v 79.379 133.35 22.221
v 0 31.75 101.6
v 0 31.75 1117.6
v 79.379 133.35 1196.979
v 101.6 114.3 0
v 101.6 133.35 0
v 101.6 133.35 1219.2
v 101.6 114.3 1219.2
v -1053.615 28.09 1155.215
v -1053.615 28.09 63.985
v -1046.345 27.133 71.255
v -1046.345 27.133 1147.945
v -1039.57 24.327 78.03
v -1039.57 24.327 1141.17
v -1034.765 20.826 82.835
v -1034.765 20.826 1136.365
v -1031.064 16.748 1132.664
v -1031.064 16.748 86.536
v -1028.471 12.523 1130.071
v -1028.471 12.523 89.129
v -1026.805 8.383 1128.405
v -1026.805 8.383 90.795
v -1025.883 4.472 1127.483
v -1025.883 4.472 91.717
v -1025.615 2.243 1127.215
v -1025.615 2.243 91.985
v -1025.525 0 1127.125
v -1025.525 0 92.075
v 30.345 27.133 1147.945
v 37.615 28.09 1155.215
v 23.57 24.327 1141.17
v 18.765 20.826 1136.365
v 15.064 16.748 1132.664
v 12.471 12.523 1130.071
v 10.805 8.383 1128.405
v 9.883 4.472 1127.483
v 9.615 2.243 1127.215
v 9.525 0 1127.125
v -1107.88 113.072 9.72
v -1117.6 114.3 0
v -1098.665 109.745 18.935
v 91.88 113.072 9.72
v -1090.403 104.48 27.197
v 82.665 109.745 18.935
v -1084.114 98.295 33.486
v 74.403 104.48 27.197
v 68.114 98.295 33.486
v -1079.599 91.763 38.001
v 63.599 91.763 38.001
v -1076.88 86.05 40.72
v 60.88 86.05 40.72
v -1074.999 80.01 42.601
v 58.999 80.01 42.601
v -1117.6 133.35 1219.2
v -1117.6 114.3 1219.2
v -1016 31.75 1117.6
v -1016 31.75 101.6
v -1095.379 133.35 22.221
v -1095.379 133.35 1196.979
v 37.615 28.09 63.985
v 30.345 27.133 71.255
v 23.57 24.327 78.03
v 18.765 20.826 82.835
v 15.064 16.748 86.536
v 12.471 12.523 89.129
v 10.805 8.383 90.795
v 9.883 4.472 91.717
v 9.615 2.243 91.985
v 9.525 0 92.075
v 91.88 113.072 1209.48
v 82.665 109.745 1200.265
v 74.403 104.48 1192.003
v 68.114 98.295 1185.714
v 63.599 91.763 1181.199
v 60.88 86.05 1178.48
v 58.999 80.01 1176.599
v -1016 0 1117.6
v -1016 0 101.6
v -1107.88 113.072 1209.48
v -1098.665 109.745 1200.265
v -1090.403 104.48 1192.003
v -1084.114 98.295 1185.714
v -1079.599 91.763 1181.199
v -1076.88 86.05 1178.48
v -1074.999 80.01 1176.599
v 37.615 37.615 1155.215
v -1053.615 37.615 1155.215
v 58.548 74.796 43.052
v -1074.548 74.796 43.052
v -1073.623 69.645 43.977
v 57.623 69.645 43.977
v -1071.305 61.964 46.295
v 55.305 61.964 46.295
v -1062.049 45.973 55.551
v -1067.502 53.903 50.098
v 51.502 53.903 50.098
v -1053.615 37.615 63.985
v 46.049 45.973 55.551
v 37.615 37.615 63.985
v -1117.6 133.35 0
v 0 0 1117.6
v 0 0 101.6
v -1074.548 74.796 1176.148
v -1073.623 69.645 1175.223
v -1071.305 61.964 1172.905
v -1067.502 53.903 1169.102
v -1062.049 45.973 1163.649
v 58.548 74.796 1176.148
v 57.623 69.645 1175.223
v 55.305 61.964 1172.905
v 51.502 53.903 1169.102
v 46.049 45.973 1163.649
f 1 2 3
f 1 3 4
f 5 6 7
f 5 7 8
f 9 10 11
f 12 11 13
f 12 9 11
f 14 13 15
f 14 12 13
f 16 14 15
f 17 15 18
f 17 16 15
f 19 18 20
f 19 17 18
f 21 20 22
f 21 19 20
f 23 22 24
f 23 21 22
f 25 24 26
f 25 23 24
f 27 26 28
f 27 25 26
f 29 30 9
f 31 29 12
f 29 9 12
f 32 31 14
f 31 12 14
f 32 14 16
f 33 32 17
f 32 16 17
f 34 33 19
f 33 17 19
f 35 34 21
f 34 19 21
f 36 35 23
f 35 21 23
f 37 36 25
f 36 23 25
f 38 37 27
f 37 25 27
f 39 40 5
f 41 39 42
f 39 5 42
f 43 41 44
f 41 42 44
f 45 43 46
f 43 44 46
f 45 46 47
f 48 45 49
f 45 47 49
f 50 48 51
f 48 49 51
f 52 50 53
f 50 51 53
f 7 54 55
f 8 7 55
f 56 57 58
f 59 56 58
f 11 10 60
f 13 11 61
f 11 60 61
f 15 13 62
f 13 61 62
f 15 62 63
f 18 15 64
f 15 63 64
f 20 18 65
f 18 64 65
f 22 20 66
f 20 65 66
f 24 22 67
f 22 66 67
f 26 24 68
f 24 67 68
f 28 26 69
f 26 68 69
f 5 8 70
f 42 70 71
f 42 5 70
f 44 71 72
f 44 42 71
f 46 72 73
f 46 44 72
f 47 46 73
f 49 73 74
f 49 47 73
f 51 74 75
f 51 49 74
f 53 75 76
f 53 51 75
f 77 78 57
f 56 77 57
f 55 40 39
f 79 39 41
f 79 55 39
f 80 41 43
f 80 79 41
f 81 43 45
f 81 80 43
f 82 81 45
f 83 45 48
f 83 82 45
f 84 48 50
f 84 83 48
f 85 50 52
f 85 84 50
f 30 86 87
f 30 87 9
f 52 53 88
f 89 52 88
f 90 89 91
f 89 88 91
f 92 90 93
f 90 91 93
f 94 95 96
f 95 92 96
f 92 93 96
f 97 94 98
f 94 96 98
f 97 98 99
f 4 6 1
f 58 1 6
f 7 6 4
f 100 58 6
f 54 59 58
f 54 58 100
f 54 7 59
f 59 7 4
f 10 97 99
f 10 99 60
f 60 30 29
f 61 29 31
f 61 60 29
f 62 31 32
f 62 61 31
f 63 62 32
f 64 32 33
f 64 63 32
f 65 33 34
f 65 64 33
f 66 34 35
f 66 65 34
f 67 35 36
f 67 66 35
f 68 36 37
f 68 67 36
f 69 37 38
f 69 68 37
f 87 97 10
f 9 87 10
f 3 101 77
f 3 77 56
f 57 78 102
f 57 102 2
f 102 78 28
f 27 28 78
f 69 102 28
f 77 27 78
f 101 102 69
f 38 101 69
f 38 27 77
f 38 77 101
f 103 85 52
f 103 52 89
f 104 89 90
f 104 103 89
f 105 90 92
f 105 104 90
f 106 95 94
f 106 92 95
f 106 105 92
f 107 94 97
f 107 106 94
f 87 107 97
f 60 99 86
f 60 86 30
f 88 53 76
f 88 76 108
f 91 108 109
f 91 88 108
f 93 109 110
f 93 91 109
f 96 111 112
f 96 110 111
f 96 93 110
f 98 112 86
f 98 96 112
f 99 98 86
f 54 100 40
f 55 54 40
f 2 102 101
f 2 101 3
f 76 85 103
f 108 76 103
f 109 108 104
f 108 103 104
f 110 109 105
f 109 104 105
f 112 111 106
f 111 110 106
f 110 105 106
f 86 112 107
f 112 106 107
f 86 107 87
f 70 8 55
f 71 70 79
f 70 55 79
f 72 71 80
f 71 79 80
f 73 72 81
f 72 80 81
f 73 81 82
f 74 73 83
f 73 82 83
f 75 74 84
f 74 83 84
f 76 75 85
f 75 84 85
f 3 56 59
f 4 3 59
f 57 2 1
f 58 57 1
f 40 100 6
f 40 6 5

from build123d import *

# Parameters (mm, degrees)
BOSS_EXTRUDE1_DEPTH = 1219.2
CUT_EXTRUDE1_DEPTH  = 134.35


with BuildPart() as part:
    # Sketch2 → Boss-Extrude1 (new body)
    with BuildSketch(Plane.XY):
        with BuildLine():
            Line((0, 0), (0, 31.75))
            Line((0, 31.75), (79.378619653, 133.35))
            Line((79.378619653, 133.35), (101.6, 133.35))
            Line((101.6, 133.35), (101.6, 114.3))
            ThreePointArc((101.6, 114.3), (74.403120681, 104.480352771), (58.99918365, 80.009667445))
            ThreePointArc((58.99918365, 80.009667445), (52.895666714, 56.49803793), (37.615267176, 37.615267176))
            Line((37.615267176, 37.615267176), (37.615267176, 28.090267176))
            ThreePointArc((37.615267176, 28.090267176), (17.75244877, 19.862818405), (9.525, 0))
            Line((9.525, 0), (0, 0))
        make_face()
    extrude(amount=BOSS_EXTRUDE1_DEPTH)

    # Sketch3 → Cut-Extrude1 (cut, through all)
    with BuildSketch(Plane(origin=(0, 133.35, 0), x_dir=(1, 0, 0), z_dir=(0, 1, 0))):
        Polygon((101.6, 0), (0, 0), (0, -101.6), align=None)
        Polygon((101.6, -1219.2), (0, -1219.2), (0, -1117.6), align=None)
    extrude(amount=-CUT_EXTRUDE1_DEPTH, mode=Mode.SUBTRACT)

    # Mirror4: part across plane


with BuildPart() as part_1:
    add(part.part)
    add(part.part.mirror(Plane(origin=(0, 0, 1117.6), x_dir=(0.707106781, 0, 0.707106781), z_dir=(0.707106781, 0, -0.707106781))))

    # Mirror5: part across plane


with BuildPart() as part_2:
    add(part_1.part)
    add(part_1.part.mirror(Plane(origin=(-1016, 0, 1117.6), x_dir=(-0.707106781, 0, 0.707106781), z_dir=(0.707106781, 0, 0.707106781))))


solid = part_2.part
